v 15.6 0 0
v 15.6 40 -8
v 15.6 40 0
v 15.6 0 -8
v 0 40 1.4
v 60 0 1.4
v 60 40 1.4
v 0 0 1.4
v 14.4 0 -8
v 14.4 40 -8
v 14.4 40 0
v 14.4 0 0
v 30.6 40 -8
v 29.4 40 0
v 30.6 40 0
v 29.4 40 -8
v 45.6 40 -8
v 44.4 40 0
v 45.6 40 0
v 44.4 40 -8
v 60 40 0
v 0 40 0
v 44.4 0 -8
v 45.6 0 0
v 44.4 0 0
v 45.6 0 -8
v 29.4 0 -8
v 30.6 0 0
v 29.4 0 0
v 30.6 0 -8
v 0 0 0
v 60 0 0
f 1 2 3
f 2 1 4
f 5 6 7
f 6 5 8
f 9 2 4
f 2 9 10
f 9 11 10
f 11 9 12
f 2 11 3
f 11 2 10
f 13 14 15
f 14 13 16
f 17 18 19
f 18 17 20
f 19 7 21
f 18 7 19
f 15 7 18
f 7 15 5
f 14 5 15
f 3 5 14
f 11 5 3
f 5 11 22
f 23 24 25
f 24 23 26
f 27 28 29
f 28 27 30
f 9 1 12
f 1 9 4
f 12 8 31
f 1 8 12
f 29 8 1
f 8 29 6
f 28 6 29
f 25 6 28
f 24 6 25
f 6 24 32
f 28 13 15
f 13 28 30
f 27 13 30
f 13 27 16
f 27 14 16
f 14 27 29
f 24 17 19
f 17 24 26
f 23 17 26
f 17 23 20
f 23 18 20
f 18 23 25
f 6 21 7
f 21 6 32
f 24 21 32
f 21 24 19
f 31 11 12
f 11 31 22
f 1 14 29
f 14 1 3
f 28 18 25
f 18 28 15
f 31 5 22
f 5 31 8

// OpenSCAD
$fn = 32;

// ----------------------------------------------------------------------
// Ribbed panel: 1.4 mm panel
// ----------------------------------------------------------------------

// --- parameters (mm) ---
panel_l = 60;             // panel length, X
panel_w = 40;             // panel width, Y
panel_t = 1.4;            // panel thickness, Z
rib_t = 1.2;              // rib thickness
rib_h = 8;                // rib height below the panel
ribs = 3;                 // number of ribs
fit_tol = 0.05;           // tolerance for press fits, mm
free_tol = 0.3;           // tolerance for clearance fits, mm

total_h = panel_t + rib_h;  // overall height

union() {
  cube([panel_l, panel_w, panel_t]);
  for (i = [1 : ribs])
    translate([i * panel_l / (ribs + 1) - rib_t / 2, 0, -rib_h])
      cube([rib_t, panel_w, rib_h + panel_t]);
}
